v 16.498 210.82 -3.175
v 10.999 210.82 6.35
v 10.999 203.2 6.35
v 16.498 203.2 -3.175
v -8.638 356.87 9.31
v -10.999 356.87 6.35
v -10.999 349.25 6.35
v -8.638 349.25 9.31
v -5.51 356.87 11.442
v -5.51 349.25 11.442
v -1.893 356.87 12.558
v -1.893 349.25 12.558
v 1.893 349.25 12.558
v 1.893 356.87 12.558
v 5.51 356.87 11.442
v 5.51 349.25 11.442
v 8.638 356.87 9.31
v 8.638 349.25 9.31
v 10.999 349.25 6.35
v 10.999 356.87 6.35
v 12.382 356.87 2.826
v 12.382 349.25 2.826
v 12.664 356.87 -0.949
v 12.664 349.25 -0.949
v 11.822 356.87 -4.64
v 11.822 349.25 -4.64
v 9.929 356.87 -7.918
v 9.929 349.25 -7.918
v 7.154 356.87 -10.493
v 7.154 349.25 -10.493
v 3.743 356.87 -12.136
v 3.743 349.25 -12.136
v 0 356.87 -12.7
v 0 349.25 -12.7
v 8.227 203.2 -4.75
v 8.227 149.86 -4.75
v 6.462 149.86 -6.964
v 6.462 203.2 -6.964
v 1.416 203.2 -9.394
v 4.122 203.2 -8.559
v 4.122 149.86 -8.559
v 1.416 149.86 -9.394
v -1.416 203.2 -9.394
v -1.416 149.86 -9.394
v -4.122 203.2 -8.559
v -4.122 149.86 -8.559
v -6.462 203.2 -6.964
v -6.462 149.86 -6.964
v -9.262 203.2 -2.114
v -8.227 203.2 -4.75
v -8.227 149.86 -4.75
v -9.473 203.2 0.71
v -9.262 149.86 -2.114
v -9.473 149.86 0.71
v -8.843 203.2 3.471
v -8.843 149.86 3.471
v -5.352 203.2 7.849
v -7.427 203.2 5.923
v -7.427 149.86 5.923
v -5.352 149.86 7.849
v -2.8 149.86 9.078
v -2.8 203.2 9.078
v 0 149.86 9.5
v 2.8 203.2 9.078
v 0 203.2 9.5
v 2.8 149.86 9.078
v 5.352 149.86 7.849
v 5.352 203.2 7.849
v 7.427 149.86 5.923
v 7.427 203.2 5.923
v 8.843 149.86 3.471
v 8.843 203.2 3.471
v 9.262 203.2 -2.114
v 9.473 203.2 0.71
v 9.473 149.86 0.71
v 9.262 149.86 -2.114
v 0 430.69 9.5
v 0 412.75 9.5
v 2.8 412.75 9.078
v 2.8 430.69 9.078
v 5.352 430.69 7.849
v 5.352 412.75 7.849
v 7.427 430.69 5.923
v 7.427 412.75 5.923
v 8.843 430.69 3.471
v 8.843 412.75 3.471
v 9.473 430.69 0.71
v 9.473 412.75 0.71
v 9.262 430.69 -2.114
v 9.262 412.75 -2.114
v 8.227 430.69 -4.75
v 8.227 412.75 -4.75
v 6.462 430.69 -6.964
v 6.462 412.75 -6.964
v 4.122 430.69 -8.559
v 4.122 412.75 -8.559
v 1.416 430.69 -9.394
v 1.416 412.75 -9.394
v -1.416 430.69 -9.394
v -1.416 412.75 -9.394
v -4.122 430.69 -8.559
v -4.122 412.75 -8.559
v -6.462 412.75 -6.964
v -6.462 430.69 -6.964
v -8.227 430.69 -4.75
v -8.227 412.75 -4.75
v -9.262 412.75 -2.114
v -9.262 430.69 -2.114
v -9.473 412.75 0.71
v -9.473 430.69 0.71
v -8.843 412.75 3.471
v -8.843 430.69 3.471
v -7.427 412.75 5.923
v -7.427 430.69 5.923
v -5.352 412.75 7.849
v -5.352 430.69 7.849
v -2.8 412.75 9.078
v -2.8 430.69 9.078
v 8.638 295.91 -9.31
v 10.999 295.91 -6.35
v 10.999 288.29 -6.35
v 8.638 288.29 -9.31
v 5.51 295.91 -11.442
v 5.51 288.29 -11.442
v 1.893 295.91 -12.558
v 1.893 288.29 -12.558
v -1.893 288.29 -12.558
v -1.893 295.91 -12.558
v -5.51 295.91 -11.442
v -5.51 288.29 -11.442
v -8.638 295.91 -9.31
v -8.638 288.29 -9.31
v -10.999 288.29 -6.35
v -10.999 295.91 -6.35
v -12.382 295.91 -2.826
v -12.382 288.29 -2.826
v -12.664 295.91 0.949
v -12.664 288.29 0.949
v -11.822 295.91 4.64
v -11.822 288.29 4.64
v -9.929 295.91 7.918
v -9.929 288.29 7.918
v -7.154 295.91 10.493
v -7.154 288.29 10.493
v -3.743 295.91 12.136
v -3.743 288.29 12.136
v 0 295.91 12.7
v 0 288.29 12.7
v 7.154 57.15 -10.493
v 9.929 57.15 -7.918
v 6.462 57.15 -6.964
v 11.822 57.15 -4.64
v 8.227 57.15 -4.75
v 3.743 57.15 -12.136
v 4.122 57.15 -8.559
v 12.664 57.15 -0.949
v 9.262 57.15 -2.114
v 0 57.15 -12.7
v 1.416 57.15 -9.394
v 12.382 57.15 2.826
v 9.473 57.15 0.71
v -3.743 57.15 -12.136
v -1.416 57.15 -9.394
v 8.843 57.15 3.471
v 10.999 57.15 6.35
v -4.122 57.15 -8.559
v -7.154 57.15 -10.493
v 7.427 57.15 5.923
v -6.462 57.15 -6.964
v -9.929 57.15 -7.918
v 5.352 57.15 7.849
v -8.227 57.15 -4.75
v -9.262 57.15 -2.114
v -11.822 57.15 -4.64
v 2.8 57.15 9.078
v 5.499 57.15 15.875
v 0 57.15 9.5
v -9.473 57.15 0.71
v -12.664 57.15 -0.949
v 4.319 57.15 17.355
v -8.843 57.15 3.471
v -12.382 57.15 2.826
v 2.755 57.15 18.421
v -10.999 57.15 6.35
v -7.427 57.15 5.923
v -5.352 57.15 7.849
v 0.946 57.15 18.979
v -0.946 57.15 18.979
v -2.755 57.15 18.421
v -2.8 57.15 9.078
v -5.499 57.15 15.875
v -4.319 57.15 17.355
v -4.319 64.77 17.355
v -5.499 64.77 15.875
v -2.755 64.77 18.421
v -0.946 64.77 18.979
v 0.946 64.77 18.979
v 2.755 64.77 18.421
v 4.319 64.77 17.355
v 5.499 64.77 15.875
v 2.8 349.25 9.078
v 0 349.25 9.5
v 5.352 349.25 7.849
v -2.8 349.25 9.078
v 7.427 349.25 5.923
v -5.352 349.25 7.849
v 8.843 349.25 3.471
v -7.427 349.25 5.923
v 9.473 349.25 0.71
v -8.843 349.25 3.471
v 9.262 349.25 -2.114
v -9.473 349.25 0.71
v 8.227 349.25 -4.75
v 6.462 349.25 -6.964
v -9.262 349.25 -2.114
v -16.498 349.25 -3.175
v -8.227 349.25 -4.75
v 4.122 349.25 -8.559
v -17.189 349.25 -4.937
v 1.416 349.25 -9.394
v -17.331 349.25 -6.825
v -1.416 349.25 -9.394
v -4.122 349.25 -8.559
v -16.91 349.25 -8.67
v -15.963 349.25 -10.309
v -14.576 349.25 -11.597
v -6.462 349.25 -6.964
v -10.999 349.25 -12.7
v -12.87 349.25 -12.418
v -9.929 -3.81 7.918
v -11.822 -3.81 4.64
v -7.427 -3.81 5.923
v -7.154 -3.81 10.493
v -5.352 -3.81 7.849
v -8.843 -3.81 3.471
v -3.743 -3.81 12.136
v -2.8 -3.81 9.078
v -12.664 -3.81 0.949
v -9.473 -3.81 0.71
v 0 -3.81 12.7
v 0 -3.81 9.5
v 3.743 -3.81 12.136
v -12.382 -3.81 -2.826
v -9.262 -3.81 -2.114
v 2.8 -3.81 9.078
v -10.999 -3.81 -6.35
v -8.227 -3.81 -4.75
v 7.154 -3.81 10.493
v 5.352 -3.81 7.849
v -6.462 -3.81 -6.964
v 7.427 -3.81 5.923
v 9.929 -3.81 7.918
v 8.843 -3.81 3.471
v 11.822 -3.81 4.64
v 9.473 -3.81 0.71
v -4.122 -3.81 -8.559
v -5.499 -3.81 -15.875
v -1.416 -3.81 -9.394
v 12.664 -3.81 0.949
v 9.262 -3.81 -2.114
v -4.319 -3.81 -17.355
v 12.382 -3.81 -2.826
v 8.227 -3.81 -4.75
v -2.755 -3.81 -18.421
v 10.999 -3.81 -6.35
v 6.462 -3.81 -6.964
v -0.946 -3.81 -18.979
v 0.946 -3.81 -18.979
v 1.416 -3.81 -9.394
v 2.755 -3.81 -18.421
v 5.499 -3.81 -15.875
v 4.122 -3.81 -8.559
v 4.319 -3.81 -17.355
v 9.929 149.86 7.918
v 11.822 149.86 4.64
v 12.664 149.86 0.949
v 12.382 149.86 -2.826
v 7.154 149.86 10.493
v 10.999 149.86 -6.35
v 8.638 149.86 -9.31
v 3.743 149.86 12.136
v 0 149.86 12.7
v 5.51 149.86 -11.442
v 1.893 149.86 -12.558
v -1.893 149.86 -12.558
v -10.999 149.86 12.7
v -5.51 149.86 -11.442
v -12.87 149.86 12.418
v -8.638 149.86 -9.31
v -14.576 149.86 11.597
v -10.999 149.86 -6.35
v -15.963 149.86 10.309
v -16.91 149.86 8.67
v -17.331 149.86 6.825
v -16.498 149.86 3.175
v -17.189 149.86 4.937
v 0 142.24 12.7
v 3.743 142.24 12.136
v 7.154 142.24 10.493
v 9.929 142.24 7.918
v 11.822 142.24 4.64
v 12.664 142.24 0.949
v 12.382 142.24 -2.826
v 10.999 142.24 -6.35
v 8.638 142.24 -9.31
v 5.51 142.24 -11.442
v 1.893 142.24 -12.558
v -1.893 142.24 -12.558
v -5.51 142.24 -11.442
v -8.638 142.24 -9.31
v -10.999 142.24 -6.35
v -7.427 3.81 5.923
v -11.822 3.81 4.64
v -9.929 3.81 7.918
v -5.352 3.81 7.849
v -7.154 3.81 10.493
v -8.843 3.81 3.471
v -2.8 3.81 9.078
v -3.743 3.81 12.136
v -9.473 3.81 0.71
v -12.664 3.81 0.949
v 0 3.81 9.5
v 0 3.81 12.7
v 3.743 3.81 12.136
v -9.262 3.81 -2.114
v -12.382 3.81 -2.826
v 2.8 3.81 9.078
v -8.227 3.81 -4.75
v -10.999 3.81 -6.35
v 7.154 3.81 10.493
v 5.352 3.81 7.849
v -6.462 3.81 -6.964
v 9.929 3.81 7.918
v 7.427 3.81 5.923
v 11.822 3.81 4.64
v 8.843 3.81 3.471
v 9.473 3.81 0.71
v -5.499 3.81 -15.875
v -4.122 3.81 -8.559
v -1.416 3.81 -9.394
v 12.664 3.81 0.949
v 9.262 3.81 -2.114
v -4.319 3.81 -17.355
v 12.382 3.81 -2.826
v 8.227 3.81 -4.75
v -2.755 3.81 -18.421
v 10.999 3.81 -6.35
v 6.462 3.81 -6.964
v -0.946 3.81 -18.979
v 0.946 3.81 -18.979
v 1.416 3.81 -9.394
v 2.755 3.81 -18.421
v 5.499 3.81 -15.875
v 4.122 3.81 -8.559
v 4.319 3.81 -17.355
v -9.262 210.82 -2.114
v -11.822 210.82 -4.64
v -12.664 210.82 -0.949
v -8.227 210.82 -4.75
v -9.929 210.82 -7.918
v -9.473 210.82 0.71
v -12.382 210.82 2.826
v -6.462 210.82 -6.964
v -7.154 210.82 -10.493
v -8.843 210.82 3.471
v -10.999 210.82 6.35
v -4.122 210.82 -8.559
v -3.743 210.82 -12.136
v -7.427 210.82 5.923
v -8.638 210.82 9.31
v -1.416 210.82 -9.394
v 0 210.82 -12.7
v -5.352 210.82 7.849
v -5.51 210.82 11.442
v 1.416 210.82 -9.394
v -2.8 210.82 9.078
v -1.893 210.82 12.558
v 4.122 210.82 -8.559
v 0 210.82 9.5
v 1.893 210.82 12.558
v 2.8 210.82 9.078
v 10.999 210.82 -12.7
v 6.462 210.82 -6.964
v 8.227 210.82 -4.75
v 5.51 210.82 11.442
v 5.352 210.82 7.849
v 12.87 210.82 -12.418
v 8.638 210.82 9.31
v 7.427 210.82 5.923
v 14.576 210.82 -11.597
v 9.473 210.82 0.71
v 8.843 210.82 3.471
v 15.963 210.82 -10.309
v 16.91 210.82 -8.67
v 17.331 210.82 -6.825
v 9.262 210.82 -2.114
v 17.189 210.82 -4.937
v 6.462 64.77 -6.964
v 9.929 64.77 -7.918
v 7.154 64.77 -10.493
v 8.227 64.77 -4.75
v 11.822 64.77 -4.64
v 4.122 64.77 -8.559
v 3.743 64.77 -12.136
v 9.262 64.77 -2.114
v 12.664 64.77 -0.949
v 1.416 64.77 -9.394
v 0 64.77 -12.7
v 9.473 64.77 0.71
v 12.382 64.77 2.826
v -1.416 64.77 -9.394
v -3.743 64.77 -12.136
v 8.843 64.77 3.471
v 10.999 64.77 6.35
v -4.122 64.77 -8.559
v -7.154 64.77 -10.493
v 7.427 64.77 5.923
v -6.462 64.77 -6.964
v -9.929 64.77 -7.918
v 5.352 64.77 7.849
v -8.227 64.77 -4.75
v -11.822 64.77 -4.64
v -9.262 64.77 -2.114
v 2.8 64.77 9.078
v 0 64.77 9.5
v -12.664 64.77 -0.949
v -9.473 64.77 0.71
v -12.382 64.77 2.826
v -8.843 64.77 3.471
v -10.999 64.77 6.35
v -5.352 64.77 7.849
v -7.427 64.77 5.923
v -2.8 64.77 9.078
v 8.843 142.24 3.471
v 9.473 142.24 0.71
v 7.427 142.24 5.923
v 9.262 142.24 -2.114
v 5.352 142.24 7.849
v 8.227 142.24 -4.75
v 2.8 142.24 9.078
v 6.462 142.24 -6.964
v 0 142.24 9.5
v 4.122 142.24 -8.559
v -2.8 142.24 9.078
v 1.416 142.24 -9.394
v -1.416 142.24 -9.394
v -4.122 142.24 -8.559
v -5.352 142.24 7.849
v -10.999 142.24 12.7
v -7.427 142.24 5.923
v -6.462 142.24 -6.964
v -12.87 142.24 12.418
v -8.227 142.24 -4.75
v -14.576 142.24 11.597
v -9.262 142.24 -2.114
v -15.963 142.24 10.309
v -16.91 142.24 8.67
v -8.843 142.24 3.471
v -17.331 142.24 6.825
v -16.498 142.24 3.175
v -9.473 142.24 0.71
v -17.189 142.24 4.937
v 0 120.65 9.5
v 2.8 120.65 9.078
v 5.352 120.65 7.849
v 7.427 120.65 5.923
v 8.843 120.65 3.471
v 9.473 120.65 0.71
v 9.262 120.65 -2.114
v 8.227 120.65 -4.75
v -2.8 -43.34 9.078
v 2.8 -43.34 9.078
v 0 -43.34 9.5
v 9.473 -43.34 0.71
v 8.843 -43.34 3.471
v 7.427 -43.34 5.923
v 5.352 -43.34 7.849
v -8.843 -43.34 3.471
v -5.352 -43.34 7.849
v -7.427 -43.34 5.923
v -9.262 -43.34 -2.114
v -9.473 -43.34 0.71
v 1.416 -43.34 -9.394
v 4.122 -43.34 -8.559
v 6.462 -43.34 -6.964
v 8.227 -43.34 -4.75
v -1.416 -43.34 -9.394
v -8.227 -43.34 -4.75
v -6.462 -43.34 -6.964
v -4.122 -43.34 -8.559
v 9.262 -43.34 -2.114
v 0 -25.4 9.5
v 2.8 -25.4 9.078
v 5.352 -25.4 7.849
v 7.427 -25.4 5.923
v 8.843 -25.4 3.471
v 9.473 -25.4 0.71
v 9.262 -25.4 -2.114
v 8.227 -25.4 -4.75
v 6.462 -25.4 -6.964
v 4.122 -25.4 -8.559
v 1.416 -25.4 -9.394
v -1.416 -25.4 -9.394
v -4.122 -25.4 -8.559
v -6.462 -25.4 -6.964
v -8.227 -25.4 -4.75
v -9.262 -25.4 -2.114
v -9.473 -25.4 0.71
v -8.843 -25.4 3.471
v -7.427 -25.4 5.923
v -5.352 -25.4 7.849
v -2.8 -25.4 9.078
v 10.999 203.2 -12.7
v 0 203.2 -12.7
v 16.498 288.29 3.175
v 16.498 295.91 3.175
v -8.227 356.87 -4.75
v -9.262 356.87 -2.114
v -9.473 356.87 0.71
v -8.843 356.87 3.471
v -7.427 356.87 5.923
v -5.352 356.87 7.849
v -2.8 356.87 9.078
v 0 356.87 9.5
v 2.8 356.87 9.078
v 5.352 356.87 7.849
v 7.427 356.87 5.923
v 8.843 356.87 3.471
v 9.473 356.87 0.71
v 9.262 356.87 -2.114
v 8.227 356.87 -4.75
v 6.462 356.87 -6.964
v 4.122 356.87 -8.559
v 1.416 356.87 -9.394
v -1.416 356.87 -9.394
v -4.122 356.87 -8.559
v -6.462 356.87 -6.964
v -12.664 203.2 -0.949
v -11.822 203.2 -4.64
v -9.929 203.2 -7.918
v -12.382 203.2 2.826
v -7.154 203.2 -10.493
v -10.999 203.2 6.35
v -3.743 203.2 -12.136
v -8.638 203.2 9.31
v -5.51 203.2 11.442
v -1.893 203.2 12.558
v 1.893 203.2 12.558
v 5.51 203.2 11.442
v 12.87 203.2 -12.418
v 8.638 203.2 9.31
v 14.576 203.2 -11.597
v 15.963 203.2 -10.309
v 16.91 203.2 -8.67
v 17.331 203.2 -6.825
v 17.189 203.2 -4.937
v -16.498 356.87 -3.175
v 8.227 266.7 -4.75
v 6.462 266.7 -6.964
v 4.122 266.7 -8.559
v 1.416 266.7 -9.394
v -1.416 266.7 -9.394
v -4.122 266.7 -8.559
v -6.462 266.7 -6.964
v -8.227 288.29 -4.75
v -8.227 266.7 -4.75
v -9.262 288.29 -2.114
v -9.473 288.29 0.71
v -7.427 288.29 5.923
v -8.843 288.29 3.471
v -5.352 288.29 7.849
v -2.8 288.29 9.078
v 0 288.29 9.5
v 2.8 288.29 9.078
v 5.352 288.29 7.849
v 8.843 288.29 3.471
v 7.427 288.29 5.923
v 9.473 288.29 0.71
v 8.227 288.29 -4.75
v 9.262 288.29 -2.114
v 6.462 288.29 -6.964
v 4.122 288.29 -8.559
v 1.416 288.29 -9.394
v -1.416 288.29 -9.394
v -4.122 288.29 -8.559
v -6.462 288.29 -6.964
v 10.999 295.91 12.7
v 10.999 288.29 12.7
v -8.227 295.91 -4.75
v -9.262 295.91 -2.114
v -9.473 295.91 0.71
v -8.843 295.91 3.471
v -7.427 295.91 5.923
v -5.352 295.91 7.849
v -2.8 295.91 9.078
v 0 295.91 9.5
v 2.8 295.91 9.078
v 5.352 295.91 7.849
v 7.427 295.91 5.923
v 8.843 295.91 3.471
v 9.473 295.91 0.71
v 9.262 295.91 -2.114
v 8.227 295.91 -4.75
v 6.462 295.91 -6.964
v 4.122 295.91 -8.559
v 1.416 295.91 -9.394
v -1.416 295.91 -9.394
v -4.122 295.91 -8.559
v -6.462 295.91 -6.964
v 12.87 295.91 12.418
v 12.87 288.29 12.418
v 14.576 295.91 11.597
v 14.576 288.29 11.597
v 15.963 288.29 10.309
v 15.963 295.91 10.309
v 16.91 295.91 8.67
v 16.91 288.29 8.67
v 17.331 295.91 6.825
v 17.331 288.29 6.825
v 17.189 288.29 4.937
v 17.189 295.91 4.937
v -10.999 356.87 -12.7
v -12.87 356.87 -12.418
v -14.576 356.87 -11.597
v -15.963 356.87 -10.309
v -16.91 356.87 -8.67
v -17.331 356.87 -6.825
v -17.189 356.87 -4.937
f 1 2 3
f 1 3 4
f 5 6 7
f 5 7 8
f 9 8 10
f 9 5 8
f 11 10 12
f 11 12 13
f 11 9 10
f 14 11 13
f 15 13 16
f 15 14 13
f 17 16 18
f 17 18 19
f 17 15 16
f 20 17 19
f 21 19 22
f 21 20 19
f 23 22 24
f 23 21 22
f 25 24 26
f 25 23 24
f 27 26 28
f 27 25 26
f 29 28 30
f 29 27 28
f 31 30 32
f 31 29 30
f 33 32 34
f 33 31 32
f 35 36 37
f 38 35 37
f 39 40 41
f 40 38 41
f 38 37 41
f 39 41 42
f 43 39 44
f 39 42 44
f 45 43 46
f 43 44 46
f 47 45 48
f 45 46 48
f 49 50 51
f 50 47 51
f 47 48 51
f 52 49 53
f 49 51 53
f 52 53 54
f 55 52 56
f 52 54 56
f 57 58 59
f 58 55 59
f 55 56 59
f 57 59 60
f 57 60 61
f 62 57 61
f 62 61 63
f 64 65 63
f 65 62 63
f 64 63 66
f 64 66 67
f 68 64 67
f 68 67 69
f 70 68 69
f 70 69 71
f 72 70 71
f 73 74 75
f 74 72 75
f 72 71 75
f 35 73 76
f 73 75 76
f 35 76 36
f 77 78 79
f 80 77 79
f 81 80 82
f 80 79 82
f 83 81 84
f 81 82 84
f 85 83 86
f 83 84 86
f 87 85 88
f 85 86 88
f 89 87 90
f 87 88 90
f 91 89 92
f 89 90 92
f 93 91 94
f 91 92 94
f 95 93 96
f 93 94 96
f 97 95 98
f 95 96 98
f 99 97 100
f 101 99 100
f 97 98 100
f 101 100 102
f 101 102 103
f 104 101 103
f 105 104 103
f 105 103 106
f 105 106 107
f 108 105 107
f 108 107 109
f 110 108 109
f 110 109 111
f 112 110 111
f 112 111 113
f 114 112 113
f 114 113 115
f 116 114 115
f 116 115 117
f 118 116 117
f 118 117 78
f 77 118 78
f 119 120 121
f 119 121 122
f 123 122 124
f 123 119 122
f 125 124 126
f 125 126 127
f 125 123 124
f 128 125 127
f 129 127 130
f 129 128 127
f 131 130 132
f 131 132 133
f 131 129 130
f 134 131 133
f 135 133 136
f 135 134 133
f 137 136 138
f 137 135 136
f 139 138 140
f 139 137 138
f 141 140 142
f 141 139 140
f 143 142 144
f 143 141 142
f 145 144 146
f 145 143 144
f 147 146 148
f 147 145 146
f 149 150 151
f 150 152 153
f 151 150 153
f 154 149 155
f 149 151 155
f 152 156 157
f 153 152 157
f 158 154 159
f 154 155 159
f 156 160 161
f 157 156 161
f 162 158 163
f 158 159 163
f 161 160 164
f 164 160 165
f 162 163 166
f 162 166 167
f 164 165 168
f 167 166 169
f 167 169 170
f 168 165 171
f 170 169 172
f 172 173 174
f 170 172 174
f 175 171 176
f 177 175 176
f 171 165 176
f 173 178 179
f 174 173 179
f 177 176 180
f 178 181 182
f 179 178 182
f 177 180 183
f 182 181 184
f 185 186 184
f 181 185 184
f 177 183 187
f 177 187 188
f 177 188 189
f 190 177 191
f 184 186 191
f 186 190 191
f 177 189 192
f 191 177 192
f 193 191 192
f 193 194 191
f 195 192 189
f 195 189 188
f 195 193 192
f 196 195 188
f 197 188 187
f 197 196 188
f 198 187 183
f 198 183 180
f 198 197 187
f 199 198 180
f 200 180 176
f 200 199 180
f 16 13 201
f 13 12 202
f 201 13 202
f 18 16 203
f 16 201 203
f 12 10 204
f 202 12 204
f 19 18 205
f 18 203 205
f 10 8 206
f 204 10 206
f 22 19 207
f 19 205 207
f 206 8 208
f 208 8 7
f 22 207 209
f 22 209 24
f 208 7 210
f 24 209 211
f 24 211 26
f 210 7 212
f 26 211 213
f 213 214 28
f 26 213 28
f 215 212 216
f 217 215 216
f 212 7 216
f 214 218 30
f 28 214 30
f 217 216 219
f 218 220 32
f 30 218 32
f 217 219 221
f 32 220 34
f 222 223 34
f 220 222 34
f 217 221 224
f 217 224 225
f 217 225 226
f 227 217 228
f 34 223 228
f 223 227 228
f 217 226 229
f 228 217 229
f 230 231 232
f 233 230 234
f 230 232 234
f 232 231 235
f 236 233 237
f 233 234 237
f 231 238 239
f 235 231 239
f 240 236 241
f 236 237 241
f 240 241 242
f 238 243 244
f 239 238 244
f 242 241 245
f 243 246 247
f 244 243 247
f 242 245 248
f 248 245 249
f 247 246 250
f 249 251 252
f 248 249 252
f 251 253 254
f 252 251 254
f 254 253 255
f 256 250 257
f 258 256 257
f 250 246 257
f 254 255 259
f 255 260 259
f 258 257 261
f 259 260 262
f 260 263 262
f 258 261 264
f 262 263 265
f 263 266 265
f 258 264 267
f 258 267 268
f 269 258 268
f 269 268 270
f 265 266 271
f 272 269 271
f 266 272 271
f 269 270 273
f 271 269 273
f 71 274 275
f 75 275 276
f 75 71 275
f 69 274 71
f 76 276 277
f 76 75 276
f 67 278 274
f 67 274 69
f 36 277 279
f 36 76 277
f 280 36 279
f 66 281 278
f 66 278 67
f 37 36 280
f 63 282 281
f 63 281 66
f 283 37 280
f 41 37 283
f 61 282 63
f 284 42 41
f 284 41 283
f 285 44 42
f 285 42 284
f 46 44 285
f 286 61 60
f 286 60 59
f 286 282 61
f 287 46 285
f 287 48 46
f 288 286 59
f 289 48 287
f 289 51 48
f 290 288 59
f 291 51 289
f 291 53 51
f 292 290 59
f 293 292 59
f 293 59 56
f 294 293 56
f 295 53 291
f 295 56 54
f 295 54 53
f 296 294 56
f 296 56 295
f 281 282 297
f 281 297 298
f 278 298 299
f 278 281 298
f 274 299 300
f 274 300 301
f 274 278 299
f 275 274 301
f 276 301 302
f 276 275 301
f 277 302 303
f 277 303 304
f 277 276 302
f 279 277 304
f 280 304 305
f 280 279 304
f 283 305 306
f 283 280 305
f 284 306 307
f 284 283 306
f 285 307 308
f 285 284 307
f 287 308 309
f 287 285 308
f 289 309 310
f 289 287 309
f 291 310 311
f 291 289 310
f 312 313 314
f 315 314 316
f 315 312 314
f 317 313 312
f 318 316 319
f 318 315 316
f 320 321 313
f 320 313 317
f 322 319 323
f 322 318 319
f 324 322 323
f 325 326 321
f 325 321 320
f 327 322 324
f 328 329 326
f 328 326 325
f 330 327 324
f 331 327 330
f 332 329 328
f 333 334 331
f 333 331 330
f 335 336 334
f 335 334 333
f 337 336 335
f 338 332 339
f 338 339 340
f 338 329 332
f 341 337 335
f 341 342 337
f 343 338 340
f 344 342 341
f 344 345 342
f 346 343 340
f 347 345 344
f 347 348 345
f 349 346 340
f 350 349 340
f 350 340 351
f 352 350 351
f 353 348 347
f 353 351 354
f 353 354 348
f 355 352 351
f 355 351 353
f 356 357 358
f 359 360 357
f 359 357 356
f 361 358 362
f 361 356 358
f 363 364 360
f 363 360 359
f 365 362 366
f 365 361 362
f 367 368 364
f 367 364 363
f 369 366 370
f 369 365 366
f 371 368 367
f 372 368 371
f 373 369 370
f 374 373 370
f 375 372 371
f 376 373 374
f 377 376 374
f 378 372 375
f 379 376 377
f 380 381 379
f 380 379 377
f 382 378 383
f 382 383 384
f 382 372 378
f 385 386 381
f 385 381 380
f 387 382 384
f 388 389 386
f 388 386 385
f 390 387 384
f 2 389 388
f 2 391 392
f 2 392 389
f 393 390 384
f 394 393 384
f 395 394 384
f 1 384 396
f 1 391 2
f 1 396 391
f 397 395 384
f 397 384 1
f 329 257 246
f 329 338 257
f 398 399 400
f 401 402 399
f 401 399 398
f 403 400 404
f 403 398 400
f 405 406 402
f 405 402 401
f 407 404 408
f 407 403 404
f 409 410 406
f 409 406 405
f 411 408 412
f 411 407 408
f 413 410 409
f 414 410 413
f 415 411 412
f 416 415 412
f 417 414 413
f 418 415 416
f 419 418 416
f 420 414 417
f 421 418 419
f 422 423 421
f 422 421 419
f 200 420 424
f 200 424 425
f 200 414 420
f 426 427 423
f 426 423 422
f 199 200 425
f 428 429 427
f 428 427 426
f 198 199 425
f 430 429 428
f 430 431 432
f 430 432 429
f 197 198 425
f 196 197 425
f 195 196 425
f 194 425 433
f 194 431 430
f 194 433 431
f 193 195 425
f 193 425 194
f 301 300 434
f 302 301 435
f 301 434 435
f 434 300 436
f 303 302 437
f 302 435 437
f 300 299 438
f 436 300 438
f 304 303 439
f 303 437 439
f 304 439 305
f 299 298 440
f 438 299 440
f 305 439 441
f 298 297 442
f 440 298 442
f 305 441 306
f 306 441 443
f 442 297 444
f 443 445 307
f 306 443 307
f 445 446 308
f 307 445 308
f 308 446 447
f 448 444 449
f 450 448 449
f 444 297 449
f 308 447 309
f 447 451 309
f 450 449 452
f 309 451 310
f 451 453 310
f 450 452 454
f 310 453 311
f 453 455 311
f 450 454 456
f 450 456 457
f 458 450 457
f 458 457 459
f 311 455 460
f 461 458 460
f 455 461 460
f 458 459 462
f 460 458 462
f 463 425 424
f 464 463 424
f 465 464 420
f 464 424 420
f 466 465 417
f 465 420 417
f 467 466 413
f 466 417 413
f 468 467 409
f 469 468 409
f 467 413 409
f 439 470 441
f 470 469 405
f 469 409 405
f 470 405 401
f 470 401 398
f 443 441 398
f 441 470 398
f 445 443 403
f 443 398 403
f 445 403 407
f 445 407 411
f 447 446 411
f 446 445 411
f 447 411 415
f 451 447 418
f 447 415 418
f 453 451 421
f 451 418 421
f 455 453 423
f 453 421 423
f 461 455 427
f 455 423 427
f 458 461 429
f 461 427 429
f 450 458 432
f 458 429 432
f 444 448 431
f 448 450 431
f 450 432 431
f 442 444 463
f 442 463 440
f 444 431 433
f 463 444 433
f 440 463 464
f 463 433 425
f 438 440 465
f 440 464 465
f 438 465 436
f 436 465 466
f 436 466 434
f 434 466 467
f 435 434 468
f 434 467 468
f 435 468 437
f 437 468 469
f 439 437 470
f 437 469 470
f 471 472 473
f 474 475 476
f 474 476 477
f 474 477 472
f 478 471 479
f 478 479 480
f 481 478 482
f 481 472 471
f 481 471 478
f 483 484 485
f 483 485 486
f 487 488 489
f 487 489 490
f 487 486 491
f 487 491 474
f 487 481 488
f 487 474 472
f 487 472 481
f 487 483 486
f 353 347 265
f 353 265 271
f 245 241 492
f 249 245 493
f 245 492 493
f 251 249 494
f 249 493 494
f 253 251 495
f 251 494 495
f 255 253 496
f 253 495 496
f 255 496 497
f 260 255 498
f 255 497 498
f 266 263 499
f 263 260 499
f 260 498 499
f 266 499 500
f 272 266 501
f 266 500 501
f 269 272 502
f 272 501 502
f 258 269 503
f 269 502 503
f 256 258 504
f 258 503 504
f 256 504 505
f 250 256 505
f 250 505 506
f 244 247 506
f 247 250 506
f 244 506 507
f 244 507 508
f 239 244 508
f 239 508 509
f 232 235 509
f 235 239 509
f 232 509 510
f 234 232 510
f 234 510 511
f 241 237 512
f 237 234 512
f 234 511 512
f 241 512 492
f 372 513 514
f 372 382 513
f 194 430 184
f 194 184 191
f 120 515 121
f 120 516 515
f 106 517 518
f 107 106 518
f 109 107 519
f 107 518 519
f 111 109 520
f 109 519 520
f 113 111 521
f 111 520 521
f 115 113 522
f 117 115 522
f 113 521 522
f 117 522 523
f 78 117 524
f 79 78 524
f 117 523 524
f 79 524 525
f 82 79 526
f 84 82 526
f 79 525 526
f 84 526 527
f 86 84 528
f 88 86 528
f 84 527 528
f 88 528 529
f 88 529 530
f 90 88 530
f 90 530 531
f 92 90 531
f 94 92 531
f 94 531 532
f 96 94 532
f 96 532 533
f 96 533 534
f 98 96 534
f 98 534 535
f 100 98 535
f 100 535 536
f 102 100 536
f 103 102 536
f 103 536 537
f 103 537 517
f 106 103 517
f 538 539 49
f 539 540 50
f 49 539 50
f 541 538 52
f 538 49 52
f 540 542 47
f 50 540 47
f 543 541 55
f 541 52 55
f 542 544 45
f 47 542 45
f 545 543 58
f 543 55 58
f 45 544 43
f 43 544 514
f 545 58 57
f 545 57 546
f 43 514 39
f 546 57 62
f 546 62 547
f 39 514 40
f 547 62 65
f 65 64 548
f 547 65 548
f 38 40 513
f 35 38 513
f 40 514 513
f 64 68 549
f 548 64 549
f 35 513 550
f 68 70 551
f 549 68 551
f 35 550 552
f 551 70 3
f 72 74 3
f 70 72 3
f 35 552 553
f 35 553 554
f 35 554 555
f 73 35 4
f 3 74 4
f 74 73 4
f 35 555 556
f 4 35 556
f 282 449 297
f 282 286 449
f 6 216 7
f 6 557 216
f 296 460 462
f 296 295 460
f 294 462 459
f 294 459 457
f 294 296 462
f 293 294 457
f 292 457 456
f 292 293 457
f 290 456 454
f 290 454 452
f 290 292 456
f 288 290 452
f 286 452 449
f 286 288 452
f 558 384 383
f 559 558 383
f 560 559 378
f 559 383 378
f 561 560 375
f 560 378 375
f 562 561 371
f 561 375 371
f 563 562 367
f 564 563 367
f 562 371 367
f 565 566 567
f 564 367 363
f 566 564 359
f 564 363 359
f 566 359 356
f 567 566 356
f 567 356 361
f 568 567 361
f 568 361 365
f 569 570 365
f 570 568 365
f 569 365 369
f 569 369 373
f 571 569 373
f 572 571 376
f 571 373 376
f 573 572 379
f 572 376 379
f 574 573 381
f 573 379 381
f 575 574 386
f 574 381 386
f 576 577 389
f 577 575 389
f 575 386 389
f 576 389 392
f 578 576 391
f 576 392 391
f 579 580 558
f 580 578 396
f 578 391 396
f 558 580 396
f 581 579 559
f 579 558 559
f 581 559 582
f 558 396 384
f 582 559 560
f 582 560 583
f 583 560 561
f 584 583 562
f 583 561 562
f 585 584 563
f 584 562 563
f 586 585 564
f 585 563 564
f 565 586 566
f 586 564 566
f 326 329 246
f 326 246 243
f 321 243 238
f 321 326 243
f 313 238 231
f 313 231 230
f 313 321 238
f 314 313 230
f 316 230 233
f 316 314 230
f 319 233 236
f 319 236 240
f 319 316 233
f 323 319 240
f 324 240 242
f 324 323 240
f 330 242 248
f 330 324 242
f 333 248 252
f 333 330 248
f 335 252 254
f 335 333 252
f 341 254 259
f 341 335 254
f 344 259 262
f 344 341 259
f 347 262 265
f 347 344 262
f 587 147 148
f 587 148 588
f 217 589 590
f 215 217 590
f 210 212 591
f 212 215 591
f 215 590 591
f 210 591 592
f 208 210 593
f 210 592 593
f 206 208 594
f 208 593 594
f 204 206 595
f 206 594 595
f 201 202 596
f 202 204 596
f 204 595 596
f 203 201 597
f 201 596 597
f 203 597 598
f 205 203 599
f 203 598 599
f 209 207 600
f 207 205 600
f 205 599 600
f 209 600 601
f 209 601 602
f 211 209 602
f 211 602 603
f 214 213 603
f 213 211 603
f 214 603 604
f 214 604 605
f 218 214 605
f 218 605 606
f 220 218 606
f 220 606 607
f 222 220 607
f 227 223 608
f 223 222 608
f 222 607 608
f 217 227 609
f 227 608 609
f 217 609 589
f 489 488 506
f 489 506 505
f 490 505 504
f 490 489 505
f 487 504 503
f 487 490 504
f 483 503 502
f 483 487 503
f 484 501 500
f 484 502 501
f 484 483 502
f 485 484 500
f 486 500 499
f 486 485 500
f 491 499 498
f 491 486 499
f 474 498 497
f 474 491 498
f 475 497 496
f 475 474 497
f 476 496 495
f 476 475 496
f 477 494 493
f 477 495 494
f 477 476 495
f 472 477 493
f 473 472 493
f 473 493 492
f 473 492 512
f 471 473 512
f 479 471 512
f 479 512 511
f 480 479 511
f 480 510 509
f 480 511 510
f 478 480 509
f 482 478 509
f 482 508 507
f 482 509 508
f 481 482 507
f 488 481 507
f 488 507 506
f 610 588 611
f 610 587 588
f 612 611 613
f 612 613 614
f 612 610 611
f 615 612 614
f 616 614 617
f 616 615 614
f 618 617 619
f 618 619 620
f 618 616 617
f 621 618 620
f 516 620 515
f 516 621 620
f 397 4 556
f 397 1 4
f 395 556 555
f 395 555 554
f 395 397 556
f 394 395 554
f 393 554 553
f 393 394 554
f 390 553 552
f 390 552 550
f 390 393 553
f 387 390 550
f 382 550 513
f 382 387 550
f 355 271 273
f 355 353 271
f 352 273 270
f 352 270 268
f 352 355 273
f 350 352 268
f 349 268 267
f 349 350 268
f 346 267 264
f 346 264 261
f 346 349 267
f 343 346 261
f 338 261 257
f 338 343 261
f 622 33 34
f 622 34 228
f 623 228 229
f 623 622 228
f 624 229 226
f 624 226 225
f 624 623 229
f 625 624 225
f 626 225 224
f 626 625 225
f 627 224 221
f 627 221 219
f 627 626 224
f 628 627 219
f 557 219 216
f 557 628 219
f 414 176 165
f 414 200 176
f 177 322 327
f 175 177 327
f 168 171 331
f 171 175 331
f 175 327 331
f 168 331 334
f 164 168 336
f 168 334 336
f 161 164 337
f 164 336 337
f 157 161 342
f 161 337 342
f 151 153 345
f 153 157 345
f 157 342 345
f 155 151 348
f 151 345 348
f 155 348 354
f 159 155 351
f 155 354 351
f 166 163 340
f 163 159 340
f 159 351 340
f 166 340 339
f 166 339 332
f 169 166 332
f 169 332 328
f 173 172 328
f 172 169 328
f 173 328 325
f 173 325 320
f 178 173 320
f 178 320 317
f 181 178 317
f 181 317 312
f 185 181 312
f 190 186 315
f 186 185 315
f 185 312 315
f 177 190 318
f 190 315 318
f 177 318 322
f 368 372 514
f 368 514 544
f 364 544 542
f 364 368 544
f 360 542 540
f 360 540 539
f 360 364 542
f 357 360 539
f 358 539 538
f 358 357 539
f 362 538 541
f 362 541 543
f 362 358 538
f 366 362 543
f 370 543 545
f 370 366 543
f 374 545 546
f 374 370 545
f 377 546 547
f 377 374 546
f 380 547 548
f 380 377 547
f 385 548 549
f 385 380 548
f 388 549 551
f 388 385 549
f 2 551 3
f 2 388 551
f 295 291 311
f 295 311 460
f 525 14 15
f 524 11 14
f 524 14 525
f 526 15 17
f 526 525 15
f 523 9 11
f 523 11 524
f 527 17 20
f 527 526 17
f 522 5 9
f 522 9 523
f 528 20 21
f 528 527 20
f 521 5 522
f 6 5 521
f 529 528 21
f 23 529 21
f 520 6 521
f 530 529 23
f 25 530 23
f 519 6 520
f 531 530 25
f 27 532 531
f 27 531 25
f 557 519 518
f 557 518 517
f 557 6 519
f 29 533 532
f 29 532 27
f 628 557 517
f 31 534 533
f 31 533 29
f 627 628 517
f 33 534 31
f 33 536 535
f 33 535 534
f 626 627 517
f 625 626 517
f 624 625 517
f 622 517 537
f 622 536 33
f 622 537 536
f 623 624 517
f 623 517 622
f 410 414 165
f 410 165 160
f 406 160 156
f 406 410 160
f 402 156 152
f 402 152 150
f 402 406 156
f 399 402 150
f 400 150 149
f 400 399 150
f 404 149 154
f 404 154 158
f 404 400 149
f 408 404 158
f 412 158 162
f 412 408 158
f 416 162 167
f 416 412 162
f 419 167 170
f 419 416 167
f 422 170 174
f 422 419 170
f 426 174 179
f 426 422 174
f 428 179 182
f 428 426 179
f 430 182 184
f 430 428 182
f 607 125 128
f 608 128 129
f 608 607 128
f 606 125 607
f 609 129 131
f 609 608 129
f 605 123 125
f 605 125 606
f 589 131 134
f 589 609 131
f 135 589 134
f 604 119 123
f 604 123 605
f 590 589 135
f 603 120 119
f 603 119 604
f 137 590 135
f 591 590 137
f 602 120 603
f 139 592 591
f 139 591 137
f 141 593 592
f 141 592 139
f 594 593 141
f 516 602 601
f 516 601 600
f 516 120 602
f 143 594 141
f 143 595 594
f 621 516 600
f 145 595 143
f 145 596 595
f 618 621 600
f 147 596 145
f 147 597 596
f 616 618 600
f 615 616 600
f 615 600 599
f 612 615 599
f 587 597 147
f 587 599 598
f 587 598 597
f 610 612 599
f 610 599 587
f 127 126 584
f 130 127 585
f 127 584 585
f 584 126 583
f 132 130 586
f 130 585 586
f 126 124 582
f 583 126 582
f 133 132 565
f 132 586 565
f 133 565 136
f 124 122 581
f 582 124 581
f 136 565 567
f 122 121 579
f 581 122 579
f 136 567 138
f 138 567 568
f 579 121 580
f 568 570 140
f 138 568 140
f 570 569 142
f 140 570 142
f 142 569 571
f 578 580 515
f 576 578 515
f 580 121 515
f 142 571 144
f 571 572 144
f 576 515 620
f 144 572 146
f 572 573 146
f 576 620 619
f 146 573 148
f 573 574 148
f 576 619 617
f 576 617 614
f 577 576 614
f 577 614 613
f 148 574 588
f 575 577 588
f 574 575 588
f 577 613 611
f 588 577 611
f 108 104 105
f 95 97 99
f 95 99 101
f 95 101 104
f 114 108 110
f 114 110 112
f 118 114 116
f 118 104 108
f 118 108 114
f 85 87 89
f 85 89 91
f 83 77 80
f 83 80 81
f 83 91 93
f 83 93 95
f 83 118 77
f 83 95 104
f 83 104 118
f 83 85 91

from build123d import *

# Parameters (mm, degrees)
BOSS_EXTRUDE1_DEPTH   = 3.81
BODY_MOVE_COPY2_ANGLE = 180
BOSS_EXTRUDE2_START   = -25.4
SKETCH2_R             = 9.5
BOSS_EXTRUDE2_DEPTH   = 146.05
LPATTERN1_COUNT       = 3
LPATTERN1_PITCH       = 146.05
BODY_MOVE_COPY3_ANGLE = 120
BODY_MOVE_COPY4_ANGLE = 120
BOSS_EXTRUDE3_START   = 17.94
SKETCH3_R             = 9.5
BOSS_EXTRUDE3_DEPTH   = 17.94
SKETCH4_R             = 9.5
BOSS_EXTRUDE4_DEPTH   = 17.94


with BuildPart() as part:
    # Sketch1 → Boss-Extrude1 (new, symmetric)
    with BuildSketch(Plane(origin=(0, 0, 0), x_dir=(1, 0, 0), z_dir=(0, 1, 0))):
        with BuildLine():
            Line((-5.499261314, 15.875), (-10.998522628, 6.35))
            ThreePointArc((-10.998522628, 6.35), (0, -12.7), (10.998522628, 6.35))
            Line((10.998522628, 6.35), (5.499261314, 15.875))
            ThreePointArc((5.499261314, 15.875), (0, 19.05), (-5.499261314, 15.875))
        make_face()
    extrude(amount=BOSS_EXTRUDE1_DEPTH, both=True)


with BuildPart() as body_2:
    # Body-Move/Copy1: copy of part
    add(part.part.moved(Location((0, 60.96, 0))))


with BuildPart() as body_2_1:
    # Body-Move/Copy2: moved
    add(body_2.part.rotate(Axis((0, 0, 0), (0, 1, 0)), BODY_MOVE_COPY2_ANGLE))


with BuildPart() as part_1:
    add(part.part)

    add(body_2_1.part)  # Boss-Extrude2 merges body 2
    # Sketch2 → Boss-Extrude2 (add)
    with BuildSketch(Plane(origin=(0, 0, 0), x_dir=(1, 0, 0), z_dir=(0, 1, 0)).offset(BOSS_EXTRUDE2_START)):
        Circle(SKETCH2_R)
    extrude(amount=BOSS_EXTRUDE2_DEPTH)


with BuildPart() as lpattern1_1:
    # LPattern1: pattern copy
    add(part_1.part.moved(Location(Vector(0, 1, 0) * (1 * LPATTERN1_PITCH))))


with BuildPart() as lpattern1_2:
    # LPattern1: pattern copy
    add(part_1.part.moved(Location(Vector(0, 1, 0) * (2 * LPATTERN1_PITCH))))


with BuildPart() as lpattern1_1_1:
    # Body-Move/Copy3: moved
    add(lpattern1_1.part.rotate(Axis((0, 0, 0), (0, 1, 0)), BODY_MOVE_COPY3_ANGLE))


with BuildPart() as lpattern1_2_1:
    # Body-Move/Copy4: moved
    add(lpattern1_2.part.rotate(Axis((0, 0, 0), (0, -1, 0)), BODY_MOVE_COPY4_ANGLE))


with BuildPart() as part_2:
    add(part_1.part)

    # Sketch3 → Boss-Extrude3 (add)
    with BuildSketch(Plane.XZ.offset(25.4).offset(BOSS_EXTRUDE3_START)):
        Circle(SKETCH3_R)
    extrude(amount=-BOSS_EXTRUDE3_DEPTH)

    # Combine1: union LPattern1_1, LPattern1_2
    add(lpattern1_1_1.part)
    add(lpattern1_2_1.part)

    # Sketch4 → Boss-Extrude4 (add)
    with BuildSketch(Plane(origin=(0, 412.75, 0), x_dir=(1, 0, 0), z_dir=(0, 1, 0))):
        Circle(SKETCH4_R)
    extrude(amount=BOSS_EXTRUDE4_DEPTH)


solid = part_2.part
